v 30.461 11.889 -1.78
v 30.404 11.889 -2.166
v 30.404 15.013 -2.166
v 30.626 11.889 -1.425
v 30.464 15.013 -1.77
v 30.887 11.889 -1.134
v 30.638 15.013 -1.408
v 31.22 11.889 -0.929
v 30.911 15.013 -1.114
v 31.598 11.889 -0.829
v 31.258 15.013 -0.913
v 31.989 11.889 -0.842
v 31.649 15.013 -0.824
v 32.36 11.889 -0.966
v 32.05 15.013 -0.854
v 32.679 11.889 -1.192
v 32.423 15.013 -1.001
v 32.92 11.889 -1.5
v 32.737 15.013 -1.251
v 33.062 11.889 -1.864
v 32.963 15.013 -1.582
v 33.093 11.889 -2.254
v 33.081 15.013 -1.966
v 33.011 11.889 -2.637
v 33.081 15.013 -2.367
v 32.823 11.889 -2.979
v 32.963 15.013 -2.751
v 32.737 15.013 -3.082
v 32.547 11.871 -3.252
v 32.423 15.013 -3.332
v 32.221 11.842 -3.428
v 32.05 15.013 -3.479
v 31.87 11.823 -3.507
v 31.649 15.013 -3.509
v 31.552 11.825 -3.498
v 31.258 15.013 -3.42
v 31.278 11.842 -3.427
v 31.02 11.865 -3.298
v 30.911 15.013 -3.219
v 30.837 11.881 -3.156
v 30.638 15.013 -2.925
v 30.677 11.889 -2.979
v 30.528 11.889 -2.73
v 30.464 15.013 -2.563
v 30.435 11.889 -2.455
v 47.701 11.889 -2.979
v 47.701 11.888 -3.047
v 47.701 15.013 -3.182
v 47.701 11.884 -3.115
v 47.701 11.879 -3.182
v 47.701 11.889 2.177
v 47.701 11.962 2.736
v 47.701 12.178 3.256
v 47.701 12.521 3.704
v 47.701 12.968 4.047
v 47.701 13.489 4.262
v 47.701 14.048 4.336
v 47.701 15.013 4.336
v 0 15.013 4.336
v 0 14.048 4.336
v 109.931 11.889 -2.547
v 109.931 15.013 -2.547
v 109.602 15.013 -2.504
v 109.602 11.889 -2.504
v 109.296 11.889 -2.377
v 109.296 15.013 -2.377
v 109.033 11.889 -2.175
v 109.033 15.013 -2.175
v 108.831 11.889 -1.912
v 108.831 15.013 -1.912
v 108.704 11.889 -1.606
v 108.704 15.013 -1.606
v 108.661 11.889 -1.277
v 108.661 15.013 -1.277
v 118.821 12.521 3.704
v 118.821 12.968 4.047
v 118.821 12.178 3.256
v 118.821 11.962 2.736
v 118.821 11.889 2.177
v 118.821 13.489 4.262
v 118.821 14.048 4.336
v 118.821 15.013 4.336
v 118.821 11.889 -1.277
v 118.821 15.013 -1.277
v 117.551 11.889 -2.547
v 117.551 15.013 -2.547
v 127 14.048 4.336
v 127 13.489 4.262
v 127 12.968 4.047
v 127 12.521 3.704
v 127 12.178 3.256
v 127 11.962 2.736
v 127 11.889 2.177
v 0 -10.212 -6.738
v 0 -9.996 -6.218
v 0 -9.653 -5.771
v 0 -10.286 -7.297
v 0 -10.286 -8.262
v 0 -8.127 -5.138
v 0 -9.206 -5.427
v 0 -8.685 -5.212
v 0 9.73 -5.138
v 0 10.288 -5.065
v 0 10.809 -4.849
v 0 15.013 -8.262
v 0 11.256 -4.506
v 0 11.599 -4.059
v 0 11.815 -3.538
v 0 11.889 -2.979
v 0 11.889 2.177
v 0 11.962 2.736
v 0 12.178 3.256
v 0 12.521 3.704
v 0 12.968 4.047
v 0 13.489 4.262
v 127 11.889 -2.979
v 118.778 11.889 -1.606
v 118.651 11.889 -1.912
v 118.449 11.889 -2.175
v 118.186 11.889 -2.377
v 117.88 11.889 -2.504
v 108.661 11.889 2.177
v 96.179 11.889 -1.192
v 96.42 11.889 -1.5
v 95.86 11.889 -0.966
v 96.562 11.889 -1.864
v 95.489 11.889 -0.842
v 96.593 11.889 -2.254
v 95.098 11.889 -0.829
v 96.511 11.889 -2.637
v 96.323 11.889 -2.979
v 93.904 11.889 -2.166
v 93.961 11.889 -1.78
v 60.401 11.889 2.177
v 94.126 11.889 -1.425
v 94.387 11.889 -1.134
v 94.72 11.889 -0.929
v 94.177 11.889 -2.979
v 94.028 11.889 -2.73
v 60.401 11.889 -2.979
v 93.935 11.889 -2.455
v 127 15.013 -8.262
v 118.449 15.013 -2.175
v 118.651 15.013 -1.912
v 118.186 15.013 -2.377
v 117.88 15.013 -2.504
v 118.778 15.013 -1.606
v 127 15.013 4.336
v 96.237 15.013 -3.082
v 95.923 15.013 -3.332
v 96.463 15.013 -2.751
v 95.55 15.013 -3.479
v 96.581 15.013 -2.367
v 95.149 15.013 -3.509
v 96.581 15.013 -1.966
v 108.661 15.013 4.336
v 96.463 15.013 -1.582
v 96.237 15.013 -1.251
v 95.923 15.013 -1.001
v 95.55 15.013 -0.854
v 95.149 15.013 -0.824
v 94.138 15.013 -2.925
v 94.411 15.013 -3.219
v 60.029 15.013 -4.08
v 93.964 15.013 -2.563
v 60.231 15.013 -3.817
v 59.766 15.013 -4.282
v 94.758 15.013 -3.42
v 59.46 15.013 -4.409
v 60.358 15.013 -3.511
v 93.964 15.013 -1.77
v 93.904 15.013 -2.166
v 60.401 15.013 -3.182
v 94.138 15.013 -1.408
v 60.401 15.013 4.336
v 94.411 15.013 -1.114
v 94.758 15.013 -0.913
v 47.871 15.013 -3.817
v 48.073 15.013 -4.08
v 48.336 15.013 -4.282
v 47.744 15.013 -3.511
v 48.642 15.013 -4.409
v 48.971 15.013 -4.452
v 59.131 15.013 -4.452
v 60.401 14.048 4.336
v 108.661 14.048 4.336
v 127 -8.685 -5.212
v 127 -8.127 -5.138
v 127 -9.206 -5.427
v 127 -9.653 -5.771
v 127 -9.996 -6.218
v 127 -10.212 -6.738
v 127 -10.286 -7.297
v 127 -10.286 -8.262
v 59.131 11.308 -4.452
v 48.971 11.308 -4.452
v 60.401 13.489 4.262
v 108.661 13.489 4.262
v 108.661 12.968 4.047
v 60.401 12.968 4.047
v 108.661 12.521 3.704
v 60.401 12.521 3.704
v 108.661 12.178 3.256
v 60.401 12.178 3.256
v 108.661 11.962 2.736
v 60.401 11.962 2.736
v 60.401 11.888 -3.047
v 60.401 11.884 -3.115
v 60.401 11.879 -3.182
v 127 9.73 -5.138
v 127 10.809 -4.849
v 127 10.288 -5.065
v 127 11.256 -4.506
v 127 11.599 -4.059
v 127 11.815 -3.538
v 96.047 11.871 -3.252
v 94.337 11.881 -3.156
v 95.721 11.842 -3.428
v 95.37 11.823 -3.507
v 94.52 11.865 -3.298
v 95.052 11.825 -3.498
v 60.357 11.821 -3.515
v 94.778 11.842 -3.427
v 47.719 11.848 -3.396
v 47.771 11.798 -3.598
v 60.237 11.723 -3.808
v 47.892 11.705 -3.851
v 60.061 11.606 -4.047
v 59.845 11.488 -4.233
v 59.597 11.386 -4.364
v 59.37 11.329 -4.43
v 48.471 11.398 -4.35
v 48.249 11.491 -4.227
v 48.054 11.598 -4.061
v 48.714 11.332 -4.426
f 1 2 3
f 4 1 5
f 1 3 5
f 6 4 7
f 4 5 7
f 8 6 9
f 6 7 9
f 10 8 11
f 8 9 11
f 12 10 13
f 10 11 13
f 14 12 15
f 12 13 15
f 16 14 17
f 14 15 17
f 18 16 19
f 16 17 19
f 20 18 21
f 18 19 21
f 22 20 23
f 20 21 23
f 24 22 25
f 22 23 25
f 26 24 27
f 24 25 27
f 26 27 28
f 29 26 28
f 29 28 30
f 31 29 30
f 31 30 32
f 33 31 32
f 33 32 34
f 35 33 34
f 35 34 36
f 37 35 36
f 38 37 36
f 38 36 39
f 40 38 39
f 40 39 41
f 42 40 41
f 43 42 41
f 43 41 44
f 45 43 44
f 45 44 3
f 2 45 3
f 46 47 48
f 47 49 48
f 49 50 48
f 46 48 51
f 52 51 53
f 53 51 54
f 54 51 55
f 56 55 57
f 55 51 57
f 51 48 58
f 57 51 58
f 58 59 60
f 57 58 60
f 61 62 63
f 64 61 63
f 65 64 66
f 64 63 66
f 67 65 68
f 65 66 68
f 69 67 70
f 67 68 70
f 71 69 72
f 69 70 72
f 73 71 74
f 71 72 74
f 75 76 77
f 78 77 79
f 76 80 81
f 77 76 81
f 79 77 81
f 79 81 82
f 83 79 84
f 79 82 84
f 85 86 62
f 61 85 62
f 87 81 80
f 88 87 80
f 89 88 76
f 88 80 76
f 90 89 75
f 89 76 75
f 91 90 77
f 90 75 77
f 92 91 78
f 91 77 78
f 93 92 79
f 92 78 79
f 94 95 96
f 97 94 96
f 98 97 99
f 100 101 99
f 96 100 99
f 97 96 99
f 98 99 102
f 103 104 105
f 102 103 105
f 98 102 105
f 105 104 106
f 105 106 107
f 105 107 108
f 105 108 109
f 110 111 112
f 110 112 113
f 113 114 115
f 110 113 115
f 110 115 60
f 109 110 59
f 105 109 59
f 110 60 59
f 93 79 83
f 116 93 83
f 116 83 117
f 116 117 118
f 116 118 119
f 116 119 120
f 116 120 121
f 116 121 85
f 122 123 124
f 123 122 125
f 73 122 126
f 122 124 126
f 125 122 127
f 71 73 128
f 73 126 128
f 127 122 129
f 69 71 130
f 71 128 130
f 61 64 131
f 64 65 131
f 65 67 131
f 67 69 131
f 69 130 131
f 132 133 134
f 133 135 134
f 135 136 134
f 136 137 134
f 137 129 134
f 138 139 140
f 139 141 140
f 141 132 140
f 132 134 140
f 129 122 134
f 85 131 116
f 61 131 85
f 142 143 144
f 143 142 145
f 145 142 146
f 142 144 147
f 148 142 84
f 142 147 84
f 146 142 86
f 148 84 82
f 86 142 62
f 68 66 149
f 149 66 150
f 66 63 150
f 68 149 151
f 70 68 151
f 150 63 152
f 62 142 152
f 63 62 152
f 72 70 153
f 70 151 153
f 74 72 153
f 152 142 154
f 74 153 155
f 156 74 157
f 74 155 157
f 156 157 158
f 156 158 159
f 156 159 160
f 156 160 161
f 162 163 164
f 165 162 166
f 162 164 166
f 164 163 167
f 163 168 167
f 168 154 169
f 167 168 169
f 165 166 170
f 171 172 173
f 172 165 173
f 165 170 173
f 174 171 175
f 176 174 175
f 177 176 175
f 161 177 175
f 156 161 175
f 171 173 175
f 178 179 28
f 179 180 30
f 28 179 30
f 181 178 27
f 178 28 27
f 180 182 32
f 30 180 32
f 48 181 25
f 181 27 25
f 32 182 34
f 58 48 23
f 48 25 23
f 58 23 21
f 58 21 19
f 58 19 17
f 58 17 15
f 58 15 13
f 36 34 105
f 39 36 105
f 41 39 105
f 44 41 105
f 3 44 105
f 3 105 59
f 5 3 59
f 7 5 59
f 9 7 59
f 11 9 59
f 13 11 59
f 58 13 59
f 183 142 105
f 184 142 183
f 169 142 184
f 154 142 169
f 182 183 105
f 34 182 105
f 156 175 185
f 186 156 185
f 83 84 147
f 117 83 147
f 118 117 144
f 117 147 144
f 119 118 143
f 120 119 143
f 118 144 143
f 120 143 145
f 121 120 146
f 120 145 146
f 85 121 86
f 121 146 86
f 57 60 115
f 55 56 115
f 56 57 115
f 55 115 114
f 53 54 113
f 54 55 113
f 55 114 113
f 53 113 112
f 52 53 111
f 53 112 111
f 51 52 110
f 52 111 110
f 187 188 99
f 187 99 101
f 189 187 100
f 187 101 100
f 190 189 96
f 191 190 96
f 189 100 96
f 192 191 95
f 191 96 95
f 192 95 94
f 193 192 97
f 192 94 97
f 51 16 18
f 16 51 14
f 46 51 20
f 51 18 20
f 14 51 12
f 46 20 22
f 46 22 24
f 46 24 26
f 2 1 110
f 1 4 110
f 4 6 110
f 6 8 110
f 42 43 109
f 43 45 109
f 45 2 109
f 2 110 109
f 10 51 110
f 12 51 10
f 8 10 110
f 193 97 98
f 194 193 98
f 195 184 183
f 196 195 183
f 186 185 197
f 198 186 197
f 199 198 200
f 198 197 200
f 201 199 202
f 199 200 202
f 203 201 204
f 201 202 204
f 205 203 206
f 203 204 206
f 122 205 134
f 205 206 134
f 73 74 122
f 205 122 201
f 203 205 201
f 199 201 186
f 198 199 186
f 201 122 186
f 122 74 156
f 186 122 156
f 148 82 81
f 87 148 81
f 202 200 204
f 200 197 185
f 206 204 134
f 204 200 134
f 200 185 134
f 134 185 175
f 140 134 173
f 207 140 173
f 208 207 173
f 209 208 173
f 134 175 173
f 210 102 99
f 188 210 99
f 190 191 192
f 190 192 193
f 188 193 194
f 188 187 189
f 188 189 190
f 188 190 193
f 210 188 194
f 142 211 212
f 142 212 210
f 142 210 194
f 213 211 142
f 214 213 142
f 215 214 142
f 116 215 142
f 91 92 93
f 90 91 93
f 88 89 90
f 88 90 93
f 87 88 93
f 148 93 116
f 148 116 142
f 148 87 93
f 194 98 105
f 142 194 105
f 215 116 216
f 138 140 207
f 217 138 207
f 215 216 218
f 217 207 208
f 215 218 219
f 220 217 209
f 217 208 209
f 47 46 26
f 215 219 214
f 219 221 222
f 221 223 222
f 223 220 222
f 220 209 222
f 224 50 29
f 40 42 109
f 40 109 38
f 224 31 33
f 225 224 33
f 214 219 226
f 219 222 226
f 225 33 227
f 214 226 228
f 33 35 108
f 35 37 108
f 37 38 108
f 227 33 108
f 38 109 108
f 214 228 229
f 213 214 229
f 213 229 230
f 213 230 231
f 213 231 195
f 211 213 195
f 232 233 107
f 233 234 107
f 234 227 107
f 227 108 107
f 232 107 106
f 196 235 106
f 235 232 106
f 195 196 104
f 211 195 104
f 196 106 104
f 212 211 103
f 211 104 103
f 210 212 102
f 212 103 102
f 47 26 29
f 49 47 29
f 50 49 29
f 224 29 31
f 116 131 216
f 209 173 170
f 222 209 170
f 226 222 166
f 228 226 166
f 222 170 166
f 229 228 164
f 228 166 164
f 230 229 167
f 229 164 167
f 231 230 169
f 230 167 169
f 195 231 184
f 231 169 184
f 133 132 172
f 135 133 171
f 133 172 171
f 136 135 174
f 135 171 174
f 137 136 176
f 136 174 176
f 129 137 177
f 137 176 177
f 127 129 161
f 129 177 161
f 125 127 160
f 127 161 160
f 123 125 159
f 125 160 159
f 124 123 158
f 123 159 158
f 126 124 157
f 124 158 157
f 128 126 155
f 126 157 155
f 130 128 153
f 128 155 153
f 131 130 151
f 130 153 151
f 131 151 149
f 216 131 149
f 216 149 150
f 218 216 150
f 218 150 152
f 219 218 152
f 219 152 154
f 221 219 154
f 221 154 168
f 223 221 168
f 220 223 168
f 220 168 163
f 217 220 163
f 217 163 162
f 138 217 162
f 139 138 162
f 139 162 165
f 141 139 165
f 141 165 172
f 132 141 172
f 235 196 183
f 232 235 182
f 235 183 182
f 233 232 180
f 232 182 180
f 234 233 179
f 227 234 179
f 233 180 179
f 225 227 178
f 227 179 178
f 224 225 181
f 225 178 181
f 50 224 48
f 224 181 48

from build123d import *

# Parameters (mm, degrees)
F1_DEPTH = 127
F2_R     = 1.3462
F3_DEPTH = 25.2994
F5_DEPTH = 25.2994


with BuildPart() as f1:
    # F0 (on Right) → F1 (new body)
    with BuildSketch(Plane.YZ):
        with BuildLine():
            Line((-10.285505, -7.297242), (-10.285505, -8.262442))
            Line((-10.285505, -8.262442), (15.012895, -8.262442))
            Line((15.012895, -8.262442), (15.012895, 4.335958))
            Line((15.012895, 4.335958), (14.047695, 4.335958))
            ThreePointArc((14.047695, 4.335958), (12.521052, 3.703602), (11.888695, 2.176958))
            Line((11.888695, 2.176958), (11.888695, -2.979242))
            ThreePointArc((11.888695, -2.979242), (11.256339, -4.505885), (9.729695, -5.138242))
            Line((9.729695, -5.138242), (-8.126505, -5.138242))
            ThreePointArc((-8.126505, -5.138242), (-9.653148, -5.770598), (-10.285505, -7.297242))
        make_face()
    extrude(amount=F1_DEPTH)

    # F2 (on face) → F3 (cut, through all)
    with BuildSketch(Plane(origin=(0, 15.012895, 0), x_dir=(-1, 0, 0), z_dir=(0, 1, 0))):
        with Locations((-31.75, -2.166442)):
            Circle(F2_R)
        with Locations((-95.25, -2.166442)):
            Circle(F2_R)
    extrude(amount=-F3_DEPTH, mode=Mode.SUBTRACT)

    # F4 (on face) → F5 (cut, through all)
    with BuildSketch(Plane(origin=(0, 15.012895, 0), x_dir=(-1, 0, 0), z_dir=(0, 1, 0))):
        with BuildLine():
            Line((-108.6612, -1.277442), (-108.6612, 4.335958))
            Line((-108.6612, 4.335958), (-118.8212, 4.335958))
            Line((-118.8212, 4.335958), (-118.8212, -1.277442))
            ThreePointArc((-118.8212, -1.277442), (-118.449226, -2.175467), (-117.5512, -2.547442))
            Line((-117.5512, -2.547442), (-109.9312, -2.547442))
            ThreePointArc((-109.9312, -2.547442), (-109.033174, -2.175467), (-108.6612, -1.277442))
        make_face()
        with BuildLine():
            Line((-47.7012, -3.182442), (-47.7012, 4.335958))
            Line((-47.7012, 4.335958), (-60.4012, 4.335958))
            Line((-60.4012, 4.335958), (-60.4012, -3.182442))
            ThreePointArc((-60.4012, -3.182442), (-60.029226, -4.080467), (-59.1312, -4.452442))
            Line((-59.1312, -4.452442), (-48.9712, -4.452442))
            ThreePointArc((-48.9712, -4.452442), (-48.073174, -4.080467), (-47.7012, -3.182442))
        make_face()
    extrude(amount=-F5_DEPTH, mode=Mode.SUBTRACT)


solid = f1.part
